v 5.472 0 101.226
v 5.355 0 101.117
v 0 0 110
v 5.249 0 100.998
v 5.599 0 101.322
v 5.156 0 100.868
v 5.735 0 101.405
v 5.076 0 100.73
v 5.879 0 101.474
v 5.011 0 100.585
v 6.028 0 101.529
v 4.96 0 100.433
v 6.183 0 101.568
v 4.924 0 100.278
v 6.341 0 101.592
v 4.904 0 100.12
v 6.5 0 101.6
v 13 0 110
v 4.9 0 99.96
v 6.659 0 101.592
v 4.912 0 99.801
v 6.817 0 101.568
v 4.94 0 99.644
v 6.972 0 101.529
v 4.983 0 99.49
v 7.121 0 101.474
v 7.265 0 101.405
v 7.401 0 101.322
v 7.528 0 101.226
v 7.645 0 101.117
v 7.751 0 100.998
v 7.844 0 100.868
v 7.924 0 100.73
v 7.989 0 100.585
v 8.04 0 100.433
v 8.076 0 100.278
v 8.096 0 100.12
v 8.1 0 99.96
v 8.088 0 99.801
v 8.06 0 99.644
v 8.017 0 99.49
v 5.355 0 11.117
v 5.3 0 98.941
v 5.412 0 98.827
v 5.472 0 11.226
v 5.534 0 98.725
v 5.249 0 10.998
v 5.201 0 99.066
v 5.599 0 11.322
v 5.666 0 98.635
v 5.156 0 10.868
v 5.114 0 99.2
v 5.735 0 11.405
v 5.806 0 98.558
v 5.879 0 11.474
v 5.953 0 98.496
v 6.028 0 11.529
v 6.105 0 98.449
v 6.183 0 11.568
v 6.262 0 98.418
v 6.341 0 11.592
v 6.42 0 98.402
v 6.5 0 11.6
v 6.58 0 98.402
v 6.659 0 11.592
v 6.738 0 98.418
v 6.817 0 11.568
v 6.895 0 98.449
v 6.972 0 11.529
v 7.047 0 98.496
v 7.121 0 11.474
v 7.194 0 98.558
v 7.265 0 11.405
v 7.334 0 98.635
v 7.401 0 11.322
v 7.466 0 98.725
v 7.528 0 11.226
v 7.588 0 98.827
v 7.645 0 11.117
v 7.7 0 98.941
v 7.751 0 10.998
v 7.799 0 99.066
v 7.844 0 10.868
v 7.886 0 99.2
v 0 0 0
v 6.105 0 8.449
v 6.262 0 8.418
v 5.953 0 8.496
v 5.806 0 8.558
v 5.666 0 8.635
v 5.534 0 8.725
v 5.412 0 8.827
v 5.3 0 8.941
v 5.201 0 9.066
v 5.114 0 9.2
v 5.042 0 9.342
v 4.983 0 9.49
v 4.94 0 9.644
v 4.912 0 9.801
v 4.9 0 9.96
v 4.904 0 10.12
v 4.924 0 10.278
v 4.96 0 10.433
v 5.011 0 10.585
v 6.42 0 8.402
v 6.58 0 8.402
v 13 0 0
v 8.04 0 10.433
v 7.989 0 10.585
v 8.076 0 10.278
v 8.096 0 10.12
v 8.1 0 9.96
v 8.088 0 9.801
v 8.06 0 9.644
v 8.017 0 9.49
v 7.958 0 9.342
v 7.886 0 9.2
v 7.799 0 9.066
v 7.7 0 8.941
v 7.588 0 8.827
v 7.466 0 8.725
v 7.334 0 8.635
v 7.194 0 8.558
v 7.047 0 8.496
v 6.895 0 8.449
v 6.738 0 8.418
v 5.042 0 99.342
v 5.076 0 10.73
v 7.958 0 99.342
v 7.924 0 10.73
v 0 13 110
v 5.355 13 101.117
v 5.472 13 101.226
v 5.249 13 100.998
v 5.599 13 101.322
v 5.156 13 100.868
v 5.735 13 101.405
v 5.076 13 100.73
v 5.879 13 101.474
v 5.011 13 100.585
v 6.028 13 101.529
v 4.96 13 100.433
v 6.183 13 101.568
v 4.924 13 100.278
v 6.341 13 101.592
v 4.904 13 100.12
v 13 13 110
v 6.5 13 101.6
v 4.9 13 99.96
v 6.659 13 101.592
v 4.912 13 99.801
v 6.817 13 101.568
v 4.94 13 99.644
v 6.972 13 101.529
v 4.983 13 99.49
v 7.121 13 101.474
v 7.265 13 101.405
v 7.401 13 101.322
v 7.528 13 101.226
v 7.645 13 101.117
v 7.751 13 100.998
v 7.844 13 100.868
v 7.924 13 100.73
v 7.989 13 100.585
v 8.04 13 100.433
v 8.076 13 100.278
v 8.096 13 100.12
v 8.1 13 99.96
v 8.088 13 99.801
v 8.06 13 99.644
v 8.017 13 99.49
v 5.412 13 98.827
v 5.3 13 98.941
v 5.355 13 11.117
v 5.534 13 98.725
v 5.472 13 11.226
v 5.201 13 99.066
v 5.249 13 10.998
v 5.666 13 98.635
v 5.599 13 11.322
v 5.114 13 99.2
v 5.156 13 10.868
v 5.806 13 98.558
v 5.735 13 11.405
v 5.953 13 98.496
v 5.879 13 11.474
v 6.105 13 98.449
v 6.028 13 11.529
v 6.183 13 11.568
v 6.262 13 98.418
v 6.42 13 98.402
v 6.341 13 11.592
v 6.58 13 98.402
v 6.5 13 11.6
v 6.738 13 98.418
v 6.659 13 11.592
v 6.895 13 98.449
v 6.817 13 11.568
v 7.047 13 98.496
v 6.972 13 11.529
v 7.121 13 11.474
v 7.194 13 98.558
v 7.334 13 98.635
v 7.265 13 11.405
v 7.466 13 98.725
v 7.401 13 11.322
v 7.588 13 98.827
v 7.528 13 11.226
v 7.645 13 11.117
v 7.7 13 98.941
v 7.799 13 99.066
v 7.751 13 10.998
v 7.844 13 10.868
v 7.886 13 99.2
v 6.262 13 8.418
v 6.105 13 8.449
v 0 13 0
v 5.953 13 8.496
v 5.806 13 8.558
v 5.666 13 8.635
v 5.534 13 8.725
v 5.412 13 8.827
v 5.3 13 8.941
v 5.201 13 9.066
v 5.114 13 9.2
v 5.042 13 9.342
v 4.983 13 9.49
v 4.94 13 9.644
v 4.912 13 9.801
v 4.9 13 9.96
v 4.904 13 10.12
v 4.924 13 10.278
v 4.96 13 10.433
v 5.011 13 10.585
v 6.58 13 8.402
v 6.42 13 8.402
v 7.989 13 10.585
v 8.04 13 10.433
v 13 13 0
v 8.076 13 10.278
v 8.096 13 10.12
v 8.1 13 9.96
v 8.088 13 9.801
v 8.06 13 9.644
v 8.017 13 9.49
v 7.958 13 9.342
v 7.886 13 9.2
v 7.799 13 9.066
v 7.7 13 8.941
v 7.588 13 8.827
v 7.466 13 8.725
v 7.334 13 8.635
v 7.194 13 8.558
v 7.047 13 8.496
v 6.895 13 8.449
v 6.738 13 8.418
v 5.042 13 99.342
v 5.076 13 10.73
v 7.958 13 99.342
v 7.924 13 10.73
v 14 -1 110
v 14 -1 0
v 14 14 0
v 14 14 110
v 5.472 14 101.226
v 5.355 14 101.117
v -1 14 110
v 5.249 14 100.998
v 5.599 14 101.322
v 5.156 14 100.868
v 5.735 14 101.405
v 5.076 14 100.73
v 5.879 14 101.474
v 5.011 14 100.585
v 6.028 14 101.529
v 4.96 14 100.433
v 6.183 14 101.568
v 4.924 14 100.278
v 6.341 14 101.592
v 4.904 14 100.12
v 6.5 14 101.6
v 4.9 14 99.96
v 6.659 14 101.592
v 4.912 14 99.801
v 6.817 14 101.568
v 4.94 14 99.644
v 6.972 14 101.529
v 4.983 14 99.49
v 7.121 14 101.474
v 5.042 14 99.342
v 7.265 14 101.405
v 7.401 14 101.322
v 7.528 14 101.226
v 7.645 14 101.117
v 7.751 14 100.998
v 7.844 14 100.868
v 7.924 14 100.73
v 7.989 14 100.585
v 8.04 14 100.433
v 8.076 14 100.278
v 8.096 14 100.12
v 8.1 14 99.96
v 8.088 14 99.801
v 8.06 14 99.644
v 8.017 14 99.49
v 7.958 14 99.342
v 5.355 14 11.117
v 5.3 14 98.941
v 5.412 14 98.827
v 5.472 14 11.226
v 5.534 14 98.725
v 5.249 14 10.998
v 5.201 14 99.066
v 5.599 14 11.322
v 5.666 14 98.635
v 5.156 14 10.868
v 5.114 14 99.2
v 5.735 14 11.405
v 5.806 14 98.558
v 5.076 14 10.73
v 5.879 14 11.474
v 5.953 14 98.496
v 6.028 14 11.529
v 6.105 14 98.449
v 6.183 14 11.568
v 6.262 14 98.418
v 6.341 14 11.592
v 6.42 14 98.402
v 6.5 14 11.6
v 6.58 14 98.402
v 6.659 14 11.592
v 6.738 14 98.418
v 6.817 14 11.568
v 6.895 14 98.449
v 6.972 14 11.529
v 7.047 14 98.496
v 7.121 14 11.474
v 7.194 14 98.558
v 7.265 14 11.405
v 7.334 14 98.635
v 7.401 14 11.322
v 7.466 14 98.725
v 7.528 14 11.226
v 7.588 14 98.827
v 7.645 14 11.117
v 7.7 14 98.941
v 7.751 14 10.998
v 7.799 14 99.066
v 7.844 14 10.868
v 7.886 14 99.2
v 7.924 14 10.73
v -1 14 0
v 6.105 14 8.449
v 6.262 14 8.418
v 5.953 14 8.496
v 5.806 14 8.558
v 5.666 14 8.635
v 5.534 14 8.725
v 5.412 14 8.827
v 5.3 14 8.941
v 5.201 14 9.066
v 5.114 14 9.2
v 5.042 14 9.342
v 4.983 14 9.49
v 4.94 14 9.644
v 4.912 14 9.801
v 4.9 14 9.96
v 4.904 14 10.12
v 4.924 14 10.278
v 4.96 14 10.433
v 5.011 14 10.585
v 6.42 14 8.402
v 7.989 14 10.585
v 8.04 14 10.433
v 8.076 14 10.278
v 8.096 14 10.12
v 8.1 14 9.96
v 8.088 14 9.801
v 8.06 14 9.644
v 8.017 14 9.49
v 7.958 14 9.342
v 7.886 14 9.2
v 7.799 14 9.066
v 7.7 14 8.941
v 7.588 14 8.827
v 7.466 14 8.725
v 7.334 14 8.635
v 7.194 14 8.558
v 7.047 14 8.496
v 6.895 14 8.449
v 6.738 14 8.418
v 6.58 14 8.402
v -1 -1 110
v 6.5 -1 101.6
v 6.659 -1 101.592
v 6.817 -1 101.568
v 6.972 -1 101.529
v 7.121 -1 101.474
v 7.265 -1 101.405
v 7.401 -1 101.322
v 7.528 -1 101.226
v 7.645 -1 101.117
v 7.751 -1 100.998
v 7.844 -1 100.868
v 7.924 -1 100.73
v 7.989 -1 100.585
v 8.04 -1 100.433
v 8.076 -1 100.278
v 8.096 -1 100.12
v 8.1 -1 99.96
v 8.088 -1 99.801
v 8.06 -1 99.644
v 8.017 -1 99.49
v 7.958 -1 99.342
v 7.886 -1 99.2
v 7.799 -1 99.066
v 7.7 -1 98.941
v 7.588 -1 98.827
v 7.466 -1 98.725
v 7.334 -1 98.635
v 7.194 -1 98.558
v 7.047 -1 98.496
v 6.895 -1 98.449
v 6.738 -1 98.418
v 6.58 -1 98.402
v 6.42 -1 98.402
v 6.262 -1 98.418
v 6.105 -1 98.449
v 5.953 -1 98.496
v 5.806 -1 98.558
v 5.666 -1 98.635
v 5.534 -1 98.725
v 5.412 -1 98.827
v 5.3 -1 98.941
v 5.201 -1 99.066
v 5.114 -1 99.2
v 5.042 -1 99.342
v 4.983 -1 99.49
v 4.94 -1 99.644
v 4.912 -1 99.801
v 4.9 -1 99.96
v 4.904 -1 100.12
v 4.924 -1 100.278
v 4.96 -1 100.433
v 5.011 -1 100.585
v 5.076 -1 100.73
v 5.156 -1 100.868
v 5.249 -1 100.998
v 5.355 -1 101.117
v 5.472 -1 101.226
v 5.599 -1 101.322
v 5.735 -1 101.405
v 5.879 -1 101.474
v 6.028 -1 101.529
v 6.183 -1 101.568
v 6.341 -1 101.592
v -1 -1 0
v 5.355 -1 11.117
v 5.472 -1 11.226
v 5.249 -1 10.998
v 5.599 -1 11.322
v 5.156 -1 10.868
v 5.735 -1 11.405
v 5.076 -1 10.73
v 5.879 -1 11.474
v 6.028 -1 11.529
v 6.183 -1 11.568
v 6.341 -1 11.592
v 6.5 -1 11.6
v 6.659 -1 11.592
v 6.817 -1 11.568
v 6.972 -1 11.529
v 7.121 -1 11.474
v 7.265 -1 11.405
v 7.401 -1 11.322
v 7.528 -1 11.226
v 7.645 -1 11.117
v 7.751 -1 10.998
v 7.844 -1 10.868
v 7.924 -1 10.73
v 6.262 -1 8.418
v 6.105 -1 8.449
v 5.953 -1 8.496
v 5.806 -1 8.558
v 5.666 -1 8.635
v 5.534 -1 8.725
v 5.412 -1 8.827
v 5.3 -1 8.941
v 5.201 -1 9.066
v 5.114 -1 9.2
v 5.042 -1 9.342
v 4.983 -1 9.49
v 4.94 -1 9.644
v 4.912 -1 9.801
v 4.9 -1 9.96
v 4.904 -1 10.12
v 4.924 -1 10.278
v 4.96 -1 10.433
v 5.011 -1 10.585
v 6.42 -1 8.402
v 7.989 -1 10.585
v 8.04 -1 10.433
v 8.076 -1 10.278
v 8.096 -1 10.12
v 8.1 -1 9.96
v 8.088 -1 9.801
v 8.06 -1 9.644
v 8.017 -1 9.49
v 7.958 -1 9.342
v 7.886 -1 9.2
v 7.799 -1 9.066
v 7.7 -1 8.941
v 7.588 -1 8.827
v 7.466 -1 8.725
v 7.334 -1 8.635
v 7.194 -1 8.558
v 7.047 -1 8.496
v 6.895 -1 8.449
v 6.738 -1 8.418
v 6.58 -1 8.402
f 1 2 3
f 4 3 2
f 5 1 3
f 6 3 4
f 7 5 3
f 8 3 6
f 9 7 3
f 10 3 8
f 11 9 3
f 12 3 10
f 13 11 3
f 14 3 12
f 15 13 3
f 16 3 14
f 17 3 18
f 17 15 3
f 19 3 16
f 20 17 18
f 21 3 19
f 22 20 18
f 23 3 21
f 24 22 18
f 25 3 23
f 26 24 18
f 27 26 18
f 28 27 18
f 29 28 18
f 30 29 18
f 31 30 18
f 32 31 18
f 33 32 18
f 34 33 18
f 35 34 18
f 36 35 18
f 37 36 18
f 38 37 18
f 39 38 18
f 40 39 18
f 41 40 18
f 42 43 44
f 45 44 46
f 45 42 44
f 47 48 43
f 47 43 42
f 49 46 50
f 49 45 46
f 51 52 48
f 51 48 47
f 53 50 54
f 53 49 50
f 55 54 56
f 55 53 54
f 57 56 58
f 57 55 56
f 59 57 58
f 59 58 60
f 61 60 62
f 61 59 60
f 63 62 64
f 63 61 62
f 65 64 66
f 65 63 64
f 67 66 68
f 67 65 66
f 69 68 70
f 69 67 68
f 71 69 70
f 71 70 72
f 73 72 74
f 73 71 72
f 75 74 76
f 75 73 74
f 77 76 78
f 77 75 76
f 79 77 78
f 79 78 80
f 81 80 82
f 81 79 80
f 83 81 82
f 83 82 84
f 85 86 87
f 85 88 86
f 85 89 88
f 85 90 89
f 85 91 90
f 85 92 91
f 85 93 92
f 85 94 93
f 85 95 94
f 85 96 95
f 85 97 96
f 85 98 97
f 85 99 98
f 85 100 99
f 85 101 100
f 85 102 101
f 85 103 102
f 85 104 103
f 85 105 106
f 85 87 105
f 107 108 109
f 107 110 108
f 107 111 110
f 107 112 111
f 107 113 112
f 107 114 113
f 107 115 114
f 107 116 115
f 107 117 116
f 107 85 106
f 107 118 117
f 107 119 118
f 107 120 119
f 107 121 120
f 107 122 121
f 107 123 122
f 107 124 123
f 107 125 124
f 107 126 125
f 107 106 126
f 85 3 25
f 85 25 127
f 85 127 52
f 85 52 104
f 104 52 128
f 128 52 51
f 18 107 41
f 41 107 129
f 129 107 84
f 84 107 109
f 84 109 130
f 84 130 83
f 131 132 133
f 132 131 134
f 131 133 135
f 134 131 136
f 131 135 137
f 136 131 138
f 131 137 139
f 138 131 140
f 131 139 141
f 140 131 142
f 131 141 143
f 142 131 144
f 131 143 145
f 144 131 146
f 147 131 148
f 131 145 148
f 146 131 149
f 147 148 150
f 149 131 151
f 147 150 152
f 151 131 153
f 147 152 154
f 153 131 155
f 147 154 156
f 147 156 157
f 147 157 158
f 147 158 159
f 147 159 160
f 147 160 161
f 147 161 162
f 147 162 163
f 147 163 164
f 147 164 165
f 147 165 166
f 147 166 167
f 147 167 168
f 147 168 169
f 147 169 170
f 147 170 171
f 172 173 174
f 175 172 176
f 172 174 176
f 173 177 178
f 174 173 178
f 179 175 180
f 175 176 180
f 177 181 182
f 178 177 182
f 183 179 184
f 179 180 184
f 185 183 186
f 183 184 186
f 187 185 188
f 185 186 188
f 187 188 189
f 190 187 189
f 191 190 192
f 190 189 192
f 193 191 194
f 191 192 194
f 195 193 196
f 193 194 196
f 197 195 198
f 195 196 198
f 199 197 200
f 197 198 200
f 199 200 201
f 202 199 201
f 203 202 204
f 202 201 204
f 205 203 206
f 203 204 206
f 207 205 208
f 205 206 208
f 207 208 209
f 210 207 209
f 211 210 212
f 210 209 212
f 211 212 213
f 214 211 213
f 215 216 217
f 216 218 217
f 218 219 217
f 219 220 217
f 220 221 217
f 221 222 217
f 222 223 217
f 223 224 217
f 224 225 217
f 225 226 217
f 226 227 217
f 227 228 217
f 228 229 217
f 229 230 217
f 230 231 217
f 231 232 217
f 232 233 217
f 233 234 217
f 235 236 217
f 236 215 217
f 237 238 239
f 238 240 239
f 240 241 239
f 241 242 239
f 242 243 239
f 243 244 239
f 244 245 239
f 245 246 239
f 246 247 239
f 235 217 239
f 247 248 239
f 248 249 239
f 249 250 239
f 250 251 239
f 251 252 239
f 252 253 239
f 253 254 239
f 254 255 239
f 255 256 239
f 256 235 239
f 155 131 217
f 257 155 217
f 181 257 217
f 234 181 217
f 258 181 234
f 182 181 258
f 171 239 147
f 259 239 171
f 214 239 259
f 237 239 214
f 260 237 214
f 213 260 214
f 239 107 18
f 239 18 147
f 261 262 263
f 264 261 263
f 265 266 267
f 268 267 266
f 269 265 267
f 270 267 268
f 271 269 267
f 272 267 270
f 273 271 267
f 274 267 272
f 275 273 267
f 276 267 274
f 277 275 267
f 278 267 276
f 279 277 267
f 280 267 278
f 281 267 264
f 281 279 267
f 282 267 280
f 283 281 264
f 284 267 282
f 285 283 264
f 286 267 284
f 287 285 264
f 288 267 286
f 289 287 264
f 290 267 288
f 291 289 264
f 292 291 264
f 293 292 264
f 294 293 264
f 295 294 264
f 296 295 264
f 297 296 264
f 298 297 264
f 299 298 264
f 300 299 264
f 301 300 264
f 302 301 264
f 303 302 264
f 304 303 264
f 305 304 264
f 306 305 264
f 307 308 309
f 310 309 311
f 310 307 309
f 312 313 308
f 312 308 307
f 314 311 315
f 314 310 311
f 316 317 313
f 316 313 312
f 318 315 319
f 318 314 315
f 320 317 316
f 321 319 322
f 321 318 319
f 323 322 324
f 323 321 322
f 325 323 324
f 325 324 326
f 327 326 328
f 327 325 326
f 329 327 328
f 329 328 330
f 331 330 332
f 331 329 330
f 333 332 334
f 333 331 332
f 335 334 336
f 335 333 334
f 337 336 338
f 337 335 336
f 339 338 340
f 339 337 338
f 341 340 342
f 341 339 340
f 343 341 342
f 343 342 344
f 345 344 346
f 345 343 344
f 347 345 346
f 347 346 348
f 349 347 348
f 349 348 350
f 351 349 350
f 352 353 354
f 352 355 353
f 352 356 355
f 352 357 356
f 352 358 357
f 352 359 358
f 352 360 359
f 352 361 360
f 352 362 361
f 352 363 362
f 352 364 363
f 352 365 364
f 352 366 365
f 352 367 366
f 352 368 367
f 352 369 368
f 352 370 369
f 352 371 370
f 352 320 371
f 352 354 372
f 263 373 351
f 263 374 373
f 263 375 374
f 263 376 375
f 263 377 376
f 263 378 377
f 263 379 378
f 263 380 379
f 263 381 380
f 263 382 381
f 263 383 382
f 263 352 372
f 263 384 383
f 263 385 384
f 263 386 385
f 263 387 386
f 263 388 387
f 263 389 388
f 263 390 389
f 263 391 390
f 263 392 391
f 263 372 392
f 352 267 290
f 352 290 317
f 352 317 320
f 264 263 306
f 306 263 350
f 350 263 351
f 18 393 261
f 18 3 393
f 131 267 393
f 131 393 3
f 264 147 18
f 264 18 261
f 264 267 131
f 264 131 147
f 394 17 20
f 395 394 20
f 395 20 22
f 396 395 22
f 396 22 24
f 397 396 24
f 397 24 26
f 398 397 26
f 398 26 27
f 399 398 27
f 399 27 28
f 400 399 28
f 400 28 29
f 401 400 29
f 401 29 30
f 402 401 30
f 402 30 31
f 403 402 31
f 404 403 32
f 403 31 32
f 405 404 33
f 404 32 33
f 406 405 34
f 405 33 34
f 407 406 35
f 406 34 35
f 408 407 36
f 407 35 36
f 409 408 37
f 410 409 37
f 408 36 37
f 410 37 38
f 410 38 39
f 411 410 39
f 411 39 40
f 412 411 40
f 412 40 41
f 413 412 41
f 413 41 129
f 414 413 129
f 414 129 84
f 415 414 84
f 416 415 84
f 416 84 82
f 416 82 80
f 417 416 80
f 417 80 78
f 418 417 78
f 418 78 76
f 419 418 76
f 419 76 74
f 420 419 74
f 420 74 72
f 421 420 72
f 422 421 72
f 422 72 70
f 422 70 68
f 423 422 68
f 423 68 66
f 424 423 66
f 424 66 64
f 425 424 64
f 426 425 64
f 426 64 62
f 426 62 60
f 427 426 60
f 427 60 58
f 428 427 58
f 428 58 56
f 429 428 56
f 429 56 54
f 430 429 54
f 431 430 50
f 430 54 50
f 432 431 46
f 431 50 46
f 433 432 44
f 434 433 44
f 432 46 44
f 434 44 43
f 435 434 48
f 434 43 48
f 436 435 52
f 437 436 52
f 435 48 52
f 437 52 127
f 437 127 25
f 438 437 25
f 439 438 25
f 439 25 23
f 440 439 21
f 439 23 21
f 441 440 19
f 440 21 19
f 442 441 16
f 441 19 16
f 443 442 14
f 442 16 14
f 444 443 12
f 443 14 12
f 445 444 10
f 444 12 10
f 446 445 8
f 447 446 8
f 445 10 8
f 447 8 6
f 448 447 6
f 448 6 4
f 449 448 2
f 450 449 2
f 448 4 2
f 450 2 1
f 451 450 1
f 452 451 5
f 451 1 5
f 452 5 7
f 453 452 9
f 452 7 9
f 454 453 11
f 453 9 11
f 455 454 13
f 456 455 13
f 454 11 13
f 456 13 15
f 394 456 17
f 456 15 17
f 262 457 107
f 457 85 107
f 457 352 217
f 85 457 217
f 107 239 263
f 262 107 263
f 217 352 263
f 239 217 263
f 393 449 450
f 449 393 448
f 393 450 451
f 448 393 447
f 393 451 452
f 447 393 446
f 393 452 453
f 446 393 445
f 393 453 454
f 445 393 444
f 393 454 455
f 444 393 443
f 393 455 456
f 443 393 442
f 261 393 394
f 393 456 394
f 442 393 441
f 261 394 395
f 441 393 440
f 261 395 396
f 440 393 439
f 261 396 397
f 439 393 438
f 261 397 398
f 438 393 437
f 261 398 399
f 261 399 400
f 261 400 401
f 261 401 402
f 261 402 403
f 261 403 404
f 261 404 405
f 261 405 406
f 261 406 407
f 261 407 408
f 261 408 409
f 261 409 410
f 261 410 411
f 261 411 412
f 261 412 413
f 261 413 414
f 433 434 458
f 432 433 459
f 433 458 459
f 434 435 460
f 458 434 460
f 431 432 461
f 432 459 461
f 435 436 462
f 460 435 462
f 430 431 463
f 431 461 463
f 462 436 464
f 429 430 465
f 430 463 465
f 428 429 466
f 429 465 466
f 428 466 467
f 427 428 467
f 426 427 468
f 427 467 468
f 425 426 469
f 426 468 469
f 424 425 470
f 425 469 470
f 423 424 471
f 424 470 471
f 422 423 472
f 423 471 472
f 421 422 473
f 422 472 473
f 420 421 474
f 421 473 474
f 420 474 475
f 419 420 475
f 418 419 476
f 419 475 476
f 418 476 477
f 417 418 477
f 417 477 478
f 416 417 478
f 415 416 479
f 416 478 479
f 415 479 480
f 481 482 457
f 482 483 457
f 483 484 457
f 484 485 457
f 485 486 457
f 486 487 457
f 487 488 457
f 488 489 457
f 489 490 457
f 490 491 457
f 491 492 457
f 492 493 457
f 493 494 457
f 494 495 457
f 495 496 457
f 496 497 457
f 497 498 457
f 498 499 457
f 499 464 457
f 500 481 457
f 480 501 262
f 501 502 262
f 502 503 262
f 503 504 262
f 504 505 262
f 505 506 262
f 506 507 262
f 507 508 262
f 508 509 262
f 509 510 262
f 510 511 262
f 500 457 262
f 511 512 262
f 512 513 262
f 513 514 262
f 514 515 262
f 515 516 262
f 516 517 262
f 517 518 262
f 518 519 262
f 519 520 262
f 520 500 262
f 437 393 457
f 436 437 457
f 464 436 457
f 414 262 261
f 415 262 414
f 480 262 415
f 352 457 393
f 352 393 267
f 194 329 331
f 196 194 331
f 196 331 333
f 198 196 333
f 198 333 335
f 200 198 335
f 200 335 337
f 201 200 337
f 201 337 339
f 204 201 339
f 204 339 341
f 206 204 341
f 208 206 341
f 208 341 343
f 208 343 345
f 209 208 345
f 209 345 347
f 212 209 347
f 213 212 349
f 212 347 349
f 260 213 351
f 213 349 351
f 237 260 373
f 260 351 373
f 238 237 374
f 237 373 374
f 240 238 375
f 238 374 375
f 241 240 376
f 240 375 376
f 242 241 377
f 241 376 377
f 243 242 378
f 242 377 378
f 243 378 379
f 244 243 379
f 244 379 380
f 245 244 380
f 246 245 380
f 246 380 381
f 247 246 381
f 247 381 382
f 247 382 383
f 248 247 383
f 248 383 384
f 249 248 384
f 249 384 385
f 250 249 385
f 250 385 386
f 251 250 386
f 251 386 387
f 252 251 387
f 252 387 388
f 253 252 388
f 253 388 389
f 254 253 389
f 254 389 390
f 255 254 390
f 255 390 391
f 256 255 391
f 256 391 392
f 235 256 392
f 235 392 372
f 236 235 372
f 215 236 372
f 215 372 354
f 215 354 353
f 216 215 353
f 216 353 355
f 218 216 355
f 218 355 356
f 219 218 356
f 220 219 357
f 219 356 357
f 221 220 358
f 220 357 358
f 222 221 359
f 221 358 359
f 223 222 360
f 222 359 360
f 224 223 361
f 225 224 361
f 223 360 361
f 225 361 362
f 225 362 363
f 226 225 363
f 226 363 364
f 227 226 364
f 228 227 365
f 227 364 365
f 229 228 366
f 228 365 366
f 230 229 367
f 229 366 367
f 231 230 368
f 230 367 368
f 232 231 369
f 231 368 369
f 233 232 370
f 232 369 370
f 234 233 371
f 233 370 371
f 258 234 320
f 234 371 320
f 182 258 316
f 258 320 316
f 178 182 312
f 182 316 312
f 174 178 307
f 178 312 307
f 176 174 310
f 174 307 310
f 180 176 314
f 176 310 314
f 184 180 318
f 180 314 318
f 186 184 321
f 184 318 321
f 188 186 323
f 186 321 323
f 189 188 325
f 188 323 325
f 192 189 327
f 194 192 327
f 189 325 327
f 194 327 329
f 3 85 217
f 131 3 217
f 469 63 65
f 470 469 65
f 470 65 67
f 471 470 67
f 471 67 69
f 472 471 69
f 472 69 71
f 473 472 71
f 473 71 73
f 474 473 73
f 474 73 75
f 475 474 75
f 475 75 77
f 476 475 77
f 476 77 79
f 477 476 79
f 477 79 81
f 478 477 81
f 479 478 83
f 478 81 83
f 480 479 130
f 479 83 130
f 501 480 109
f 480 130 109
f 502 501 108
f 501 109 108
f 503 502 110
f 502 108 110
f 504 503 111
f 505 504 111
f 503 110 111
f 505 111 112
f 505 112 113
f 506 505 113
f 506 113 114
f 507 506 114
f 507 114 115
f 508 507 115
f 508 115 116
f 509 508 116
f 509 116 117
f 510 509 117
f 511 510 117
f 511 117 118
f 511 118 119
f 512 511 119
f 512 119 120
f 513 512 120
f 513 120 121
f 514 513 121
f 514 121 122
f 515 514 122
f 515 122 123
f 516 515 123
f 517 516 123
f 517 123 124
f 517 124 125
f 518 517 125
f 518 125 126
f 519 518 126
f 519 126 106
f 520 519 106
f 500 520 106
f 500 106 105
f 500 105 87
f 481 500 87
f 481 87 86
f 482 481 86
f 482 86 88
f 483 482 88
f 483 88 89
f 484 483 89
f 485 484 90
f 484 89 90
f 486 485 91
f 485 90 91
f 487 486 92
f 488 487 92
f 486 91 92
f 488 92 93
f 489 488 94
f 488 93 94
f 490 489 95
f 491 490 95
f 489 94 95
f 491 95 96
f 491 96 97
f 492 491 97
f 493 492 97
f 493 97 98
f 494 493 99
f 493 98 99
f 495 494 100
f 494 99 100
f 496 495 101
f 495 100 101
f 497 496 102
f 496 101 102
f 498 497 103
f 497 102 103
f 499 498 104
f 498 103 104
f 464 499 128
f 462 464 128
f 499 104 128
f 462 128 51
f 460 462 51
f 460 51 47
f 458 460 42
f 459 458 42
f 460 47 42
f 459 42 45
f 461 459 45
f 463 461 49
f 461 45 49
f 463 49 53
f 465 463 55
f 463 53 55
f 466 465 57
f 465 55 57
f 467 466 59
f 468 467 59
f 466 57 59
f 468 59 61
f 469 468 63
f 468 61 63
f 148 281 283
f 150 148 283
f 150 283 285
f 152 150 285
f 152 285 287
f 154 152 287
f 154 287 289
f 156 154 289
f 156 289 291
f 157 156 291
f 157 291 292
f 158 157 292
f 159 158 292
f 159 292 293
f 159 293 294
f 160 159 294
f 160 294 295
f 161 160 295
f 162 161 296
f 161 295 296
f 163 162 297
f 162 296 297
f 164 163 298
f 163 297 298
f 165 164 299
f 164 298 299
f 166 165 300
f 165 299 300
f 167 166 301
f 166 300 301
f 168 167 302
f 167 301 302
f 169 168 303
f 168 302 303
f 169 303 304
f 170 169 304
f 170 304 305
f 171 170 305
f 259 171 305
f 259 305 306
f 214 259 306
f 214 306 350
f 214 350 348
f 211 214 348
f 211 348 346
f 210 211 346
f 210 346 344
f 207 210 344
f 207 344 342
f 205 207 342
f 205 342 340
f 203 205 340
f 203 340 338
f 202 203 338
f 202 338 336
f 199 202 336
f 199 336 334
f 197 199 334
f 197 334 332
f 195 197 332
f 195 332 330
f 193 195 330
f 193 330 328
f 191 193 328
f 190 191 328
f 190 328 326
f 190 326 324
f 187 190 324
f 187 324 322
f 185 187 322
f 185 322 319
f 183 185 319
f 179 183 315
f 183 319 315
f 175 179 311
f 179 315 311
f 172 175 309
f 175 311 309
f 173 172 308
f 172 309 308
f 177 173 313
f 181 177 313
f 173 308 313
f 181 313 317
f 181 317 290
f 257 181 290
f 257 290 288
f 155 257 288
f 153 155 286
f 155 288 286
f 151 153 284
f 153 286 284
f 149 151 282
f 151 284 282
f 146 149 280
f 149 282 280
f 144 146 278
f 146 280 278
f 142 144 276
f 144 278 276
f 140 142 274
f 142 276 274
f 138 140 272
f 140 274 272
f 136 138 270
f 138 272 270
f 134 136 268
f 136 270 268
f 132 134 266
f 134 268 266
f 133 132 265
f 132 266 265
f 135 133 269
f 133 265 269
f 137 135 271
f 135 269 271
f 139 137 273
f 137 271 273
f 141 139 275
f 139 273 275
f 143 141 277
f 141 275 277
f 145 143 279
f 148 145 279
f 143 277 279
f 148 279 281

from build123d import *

# Parameters (mm, degrees)
SKETCH_1_W          = 15
SKETCH_1_H          = 15
SKETCH_1_W_2        = 13
SKETCH_1_H_2        = 13
EXTRUDE_1_DEPTH     = 110
SKETCH_2_R          = 1.6
CUT_EXTRUDE_1_DEPTH = 32


with BuildPart() as part:
    # 草图1 → 拉伸-薄壁1 (new body)
    with BuildSketch(Plane.XY):
        with Locations((6.5, 6.5)):
            Rectangle(SKETCH_1_W, SKETCH_1_H)
        with Locations((6.5, 6.5)):
            Rectangle(SKETCH_1_W_2, SKETCH_1_H_2, mode=Mode.SUBTRACT)
    extrude(amount=EXTRUDE_1_DEPTH)

    # 草图2 → 切除-拉伸1 (cut)
    with BuildSketch(Plane(origin=(0, 14, 0), x_dir=(1, 0, 0), z_dir=(0, 1, 0))):
        with Locations(Location((6.5, -10, 0), (0, 0, 270))):
            Circle(SKETCH_2_R)
        with Locations(Location((6.5, -100, 0), (0, 0, 270))):
            Circle(SKETCH_2_R)
    extrude(amount=-CUT_EXTRUDE_1_DEPTH, mode=Mode.SUBTRACT)


solid = part.part
